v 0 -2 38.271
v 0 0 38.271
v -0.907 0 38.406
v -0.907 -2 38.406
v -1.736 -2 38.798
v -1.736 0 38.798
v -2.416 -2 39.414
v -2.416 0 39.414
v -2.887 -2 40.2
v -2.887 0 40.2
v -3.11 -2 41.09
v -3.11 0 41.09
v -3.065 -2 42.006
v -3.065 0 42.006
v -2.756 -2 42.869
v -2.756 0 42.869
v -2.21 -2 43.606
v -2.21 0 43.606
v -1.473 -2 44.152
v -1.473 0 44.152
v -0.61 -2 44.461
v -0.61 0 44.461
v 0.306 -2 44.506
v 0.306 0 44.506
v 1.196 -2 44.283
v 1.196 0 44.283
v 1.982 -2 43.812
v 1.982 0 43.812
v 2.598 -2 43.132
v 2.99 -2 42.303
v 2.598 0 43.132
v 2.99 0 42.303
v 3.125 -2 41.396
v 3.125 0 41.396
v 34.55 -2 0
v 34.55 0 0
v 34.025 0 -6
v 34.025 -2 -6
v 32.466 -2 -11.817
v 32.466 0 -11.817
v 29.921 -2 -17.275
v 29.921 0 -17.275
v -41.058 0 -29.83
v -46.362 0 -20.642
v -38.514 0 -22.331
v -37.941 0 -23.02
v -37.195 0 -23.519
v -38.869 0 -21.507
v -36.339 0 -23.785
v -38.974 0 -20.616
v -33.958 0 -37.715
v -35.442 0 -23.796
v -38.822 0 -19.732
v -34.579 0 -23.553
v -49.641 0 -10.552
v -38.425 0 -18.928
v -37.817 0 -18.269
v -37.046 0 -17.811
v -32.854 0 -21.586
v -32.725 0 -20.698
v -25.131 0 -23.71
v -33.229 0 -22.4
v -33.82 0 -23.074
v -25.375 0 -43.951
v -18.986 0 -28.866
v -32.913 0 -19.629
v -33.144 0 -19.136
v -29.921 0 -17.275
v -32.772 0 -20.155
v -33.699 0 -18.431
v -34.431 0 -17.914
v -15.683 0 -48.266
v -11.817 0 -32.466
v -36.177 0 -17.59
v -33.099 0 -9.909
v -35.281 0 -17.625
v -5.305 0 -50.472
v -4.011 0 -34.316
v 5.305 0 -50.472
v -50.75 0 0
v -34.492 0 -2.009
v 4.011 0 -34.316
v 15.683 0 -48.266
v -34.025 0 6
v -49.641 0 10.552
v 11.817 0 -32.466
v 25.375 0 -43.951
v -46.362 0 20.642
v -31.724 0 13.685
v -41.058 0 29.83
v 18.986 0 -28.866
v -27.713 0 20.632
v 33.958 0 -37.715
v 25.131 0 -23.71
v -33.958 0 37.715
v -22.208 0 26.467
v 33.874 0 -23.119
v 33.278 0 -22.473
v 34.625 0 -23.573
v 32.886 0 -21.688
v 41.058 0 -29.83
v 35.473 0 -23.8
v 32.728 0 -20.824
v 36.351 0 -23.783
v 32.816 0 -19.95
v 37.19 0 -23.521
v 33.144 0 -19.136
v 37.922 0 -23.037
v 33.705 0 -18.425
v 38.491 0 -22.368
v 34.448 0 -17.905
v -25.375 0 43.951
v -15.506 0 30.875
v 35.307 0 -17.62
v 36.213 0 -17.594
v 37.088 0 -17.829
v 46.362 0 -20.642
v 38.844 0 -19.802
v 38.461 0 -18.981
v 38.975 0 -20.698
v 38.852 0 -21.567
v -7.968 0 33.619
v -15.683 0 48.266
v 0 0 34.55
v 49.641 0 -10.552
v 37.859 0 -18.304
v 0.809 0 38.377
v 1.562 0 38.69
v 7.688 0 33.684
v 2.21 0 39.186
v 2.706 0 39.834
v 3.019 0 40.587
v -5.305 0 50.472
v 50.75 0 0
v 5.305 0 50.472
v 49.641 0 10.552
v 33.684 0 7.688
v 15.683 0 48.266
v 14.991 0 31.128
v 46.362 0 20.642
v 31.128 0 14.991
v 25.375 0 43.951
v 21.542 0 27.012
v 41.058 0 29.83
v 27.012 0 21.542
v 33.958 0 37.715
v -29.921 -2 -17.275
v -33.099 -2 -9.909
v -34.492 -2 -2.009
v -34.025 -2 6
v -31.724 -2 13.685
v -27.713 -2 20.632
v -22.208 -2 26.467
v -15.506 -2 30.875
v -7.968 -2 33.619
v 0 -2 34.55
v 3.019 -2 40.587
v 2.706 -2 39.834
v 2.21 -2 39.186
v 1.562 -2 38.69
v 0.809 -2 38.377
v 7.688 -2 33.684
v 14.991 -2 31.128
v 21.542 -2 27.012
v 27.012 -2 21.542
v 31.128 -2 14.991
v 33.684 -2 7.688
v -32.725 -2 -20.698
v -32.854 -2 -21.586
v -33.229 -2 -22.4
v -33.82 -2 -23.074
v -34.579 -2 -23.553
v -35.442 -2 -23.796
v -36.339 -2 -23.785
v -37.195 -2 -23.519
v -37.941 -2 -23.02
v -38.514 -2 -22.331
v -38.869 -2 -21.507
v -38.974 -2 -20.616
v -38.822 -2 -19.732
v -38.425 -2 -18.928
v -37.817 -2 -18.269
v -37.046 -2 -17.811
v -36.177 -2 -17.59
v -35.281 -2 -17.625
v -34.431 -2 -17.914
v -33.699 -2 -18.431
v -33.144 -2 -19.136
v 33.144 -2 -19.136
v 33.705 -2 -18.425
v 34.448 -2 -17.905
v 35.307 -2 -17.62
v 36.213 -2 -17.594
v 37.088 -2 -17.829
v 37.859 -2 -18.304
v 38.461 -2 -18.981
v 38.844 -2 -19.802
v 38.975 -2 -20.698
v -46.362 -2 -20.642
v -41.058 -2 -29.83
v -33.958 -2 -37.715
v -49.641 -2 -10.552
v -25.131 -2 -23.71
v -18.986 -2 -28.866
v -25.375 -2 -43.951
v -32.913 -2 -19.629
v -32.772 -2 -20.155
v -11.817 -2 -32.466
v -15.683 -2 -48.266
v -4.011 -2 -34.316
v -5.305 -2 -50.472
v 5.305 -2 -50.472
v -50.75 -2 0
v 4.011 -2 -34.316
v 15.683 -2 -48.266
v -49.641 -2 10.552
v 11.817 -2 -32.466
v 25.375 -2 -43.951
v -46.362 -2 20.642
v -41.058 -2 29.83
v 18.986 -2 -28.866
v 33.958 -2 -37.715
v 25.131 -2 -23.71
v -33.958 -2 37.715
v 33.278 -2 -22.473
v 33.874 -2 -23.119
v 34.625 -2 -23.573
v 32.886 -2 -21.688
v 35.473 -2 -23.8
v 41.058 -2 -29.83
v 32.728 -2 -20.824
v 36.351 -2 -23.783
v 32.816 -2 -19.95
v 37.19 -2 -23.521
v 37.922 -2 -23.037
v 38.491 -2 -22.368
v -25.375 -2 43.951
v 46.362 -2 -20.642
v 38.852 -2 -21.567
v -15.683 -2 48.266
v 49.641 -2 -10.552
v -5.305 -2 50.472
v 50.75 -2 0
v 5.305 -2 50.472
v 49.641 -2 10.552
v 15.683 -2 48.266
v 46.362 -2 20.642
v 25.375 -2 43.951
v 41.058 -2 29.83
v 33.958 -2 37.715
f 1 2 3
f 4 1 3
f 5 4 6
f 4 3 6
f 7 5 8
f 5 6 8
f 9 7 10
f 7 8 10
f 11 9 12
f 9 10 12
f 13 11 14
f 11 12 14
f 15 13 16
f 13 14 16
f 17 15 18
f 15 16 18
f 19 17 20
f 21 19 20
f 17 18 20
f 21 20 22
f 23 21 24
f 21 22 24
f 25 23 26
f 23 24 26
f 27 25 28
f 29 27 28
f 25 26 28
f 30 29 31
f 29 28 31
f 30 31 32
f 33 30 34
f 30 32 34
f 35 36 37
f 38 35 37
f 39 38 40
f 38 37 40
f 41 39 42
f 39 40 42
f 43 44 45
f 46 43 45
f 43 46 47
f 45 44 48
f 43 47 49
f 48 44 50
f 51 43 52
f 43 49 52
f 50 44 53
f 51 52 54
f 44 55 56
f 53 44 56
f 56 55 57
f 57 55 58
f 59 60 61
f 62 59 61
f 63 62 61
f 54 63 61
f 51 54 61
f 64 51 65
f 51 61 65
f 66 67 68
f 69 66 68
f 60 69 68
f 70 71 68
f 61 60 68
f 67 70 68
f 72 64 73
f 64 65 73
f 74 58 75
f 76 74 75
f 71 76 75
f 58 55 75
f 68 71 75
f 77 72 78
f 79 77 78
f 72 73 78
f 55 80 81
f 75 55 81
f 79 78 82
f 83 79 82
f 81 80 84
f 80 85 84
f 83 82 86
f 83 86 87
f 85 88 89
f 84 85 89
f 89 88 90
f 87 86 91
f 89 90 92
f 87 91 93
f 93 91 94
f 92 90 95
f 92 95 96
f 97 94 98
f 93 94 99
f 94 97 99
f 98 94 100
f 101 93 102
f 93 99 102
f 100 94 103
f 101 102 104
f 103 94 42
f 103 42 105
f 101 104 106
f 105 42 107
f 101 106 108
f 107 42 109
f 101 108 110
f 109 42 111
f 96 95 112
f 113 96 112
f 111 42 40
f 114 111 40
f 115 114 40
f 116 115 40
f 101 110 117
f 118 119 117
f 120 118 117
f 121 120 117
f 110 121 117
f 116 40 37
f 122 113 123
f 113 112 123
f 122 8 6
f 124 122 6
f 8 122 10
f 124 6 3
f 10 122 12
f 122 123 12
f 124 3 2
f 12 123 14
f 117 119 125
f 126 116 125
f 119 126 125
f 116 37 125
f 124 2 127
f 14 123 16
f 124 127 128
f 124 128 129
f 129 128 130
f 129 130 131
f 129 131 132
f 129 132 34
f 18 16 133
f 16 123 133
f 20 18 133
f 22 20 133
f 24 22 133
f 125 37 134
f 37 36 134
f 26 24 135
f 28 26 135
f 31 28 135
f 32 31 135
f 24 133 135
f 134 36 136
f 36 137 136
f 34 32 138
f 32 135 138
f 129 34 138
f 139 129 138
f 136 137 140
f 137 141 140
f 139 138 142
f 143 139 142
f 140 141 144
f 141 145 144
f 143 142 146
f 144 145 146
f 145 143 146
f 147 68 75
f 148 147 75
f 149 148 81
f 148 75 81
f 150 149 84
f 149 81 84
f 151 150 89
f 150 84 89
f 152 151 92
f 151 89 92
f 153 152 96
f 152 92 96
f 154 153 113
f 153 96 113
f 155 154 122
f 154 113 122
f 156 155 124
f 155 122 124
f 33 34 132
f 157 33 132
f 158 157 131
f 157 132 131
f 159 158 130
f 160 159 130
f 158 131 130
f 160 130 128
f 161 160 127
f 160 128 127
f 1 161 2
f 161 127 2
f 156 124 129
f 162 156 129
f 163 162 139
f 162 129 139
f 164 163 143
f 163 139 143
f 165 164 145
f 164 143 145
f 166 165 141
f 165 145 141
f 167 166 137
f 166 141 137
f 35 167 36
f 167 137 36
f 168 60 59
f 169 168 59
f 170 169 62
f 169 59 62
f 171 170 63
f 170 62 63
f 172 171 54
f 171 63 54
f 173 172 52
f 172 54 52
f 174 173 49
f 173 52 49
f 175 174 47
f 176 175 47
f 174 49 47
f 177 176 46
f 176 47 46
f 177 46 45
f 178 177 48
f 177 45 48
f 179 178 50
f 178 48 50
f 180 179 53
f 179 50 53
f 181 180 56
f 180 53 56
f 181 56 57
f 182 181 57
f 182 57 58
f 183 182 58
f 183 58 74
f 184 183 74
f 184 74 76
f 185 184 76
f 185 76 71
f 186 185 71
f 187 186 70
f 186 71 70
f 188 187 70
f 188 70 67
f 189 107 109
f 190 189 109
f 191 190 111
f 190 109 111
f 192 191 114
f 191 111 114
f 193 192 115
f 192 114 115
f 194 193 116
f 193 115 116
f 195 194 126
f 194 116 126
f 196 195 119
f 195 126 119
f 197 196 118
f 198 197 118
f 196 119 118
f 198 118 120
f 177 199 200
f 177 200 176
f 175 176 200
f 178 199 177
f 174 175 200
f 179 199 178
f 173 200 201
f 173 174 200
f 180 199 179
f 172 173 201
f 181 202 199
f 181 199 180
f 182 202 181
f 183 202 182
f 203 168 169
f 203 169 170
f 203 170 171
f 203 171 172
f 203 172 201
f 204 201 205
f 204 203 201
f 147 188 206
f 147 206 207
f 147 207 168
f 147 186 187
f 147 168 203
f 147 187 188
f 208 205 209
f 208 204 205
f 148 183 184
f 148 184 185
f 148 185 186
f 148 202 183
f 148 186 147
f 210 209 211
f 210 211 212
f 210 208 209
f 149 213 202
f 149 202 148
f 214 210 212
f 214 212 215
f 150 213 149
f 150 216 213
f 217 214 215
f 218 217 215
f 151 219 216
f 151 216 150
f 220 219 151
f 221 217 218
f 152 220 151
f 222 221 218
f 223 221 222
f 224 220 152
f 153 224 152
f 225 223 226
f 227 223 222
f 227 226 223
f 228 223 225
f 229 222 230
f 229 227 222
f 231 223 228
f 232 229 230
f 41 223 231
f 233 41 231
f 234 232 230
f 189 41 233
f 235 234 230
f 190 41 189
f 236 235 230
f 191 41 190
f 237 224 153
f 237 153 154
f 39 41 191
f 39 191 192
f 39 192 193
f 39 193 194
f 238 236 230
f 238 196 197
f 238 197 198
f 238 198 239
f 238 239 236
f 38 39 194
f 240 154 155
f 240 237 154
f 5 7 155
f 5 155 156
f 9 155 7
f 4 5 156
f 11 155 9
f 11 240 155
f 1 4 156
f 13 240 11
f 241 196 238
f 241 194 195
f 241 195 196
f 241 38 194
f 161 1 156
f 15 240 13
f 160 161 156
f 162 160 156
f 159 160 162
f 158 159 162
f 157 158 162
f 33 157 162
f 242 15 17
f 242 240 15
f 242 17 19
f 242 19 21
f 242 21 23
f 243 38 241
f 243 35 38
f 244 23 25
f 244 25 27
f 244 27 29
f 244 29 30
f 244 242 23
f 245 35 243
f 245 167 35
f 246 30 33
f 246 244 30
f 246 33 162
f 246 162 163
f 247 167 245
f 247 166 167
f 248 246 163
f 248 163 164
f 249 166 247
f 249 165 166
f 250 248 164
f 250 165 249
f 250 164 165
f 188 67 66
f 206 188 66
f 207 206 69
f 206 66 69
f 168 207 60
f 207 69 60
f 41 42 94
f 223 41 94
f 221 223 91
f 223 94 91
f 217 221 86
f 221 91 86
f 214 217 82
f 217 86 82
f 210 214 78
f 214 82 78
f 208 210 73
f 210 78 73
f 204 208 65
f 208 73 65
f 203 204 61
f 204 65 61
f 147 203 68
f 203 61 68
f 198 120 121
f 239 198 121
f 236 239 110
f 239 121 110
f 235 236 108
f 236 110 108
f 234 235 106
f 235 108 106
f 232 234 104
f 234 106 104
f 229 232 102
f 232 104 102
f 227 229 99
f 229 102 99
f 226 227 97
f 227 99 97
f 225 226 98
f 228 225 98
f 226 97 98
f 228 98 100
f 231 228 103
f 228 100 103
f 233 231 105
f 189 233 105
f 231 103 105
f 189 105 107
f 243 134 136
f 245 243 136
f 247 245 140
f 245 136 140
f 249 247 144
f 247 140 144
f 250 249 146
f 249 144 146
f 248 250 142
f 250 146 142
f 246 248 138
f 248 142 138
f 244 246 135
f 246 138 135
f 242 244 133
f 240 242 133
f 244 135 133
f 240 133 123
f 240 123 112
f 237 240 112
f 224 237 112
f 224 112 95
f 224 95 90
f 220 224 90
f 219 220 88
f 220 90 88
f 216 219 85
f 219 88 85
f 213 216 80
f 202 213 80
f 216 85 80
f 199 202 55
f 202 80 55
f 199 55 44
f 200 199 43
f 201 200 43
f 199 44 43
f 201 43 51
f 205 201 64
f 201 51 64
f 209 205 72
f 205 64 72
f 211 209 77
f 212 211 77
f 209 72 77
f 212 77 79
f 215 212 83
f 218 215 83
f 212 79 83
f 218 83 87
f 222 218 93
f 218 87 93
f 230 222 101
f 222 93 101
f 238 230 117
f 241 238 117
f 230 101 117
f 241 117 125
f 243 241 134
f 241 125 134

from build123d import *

# Parameters (mm, degrees)
F0_R     = 50.75
F1_DEPTH = 2


with BuildPart() as f1:
    # F0 (on Front) → F1 (new body)
    with BuildSketch(Plane.XZ):
        Circle(F0_R)
        with BuildLine():
            ThreePointArc((-32.725, -20.698007), (-38.868518, -21.506817), (-33.143671, -19.135507))
            ThreePointArc((-33.143671, -19.135507), (-32.831482, -19.889198), (-32.725, -20.698007))
        make_face(mode=Mode.SUBTRACT)
        with BuildLine():
            ThreePointArc((38.975, -20.698007), (35.04119, -23.716525), (33.143671, -19.135507))
            ThreePointArc((33.143671, -19.135507), (36.65881, -17.679489), (38.975, -20.698007))
        make_face(mode=Mode.SUBTRACT)
        with BuildLine():
            ThreePointArc((-29.921178, -17.275), (-29.921178, 17.275), (0, 34.55))
            ThreePointArc((0, 34.55), (24.430539, 24.430539), (34.55, 0))
            ThreePointArc((34.55, 0), (33.372737, -8.942198), (29.921178, -17.275))
            ThreePointArc((29.921178, -17.275), (0, -34.55), (-29.921178, -17.275))
        make_face(mode=Mode.SUBTRACT)
        with BuildLine():
            ThreePointArc((0, 38.271014), (-2.209709, 43.605723), (3.125, 41.396014))
            ThreePointArc((3.125, 41.396014), (2.209709, 39.186306), (0, 38.271014))
        make_face(mode=Mode.SUBTRACT)
    extrude(amount=F1_DEPTH)


solid = f1.part
